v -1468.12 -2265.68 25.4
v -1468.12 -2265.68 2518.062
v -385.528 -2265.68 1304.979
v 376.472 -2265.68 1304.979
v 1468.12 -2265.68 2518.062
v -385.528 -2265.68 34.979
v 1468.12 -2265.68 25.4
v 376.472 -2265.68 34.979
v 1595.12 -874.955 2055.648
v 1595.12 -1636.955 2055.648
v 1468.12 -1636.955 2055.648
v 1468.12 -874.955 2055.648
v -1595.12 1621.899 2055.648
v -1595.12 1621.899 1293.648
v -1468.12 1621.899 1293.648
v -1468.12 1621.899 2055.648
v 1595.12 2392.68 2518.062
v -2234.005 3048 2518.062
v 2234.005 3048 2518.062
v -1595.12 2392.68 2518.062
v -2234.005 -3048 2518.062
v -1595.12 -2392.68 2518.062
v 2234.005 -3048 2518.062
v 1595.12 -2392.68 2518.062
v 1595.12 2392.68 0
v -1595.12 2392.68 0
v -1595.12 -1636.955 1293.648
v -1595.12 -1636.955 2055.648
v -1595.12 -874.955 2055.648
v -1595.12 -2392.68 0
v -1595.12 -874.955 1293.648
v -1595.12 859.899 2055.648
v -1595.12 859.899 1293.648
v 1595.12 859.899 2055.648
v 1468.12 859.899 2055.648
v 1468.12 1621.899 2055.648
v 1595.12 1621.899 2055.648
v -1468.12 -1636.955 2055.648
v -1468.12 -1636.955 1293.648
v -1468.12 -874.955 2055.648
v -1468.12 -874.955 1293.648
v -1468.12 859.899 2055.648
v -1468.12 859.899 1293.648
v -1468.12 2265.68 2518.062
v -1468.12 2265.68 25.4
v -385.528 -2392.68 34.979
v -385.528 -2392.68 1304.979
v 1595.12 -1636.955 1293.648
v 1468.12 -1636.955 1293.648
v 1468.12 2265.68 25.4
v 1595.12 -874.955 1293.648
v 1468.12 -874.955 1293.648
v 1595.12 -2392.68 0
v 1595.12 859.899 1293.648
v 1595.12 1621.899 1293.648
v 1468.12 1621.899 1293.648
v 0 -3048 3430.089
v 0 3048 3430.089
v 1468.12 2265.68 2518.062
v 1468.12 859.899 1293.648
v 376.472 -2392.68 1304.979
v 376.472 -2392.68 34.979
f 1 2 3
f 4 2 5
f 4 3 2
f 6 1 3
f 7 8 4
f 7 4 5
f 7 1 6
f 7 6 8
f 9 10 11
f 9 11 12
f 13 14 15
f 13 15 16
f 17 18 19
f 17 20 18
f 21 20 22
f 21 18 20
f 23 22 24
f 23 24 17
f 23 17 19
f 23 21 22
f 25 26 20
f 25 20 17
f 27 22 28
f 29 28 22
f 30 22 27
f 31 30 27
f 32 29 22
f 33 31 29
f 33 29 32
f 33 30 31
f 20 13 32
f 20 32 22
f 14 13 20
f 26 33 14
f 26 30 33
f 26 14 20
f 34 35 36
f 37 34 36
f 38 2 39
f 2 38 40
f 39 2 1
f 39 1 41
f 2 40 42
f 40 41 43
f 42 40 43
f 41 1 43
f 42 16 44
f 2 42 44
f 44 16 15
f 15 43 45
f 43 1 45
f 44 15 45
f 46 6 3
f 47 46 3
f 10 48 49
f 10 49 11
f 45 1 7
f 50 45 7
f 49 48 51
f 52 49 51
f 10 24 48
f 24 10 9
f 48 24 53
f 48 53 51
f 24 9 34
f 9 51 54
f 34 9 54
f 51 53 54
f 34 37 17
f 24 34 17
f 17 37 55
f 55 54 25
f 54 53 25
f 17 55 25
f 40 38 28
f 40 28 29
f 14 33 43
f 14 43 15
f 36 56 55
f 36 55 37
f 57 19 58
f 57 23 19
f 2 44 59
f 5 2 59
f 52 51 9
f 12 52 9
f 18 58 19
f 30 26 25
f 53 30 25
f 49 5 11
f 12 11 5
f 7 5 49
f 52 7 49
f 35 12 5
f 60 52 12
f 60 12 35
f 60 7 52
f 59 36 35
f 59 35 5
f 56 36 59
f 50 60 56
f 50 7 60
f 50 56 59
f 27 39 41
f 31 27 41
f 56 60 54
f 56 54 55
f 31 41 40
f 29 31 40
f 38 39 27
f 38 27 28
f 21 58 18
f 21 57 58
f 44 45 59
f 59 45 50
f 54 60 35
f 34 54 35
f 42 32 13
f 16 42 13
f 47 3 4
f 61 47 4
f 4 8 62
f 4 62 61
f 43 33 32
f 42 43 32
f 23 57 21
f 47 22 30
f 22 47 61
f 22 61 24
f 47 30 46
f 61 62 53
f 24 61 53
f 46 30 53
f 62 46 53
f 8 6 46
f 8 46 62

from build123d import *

# Parameters (mm, degrees)
F0_W     = 3190.24
F0_H     = 4785.36
F0_W_2   = 2936.24
F0_H_2   = 4531.36
F1_DEPTH = 2540
F2_DEPTH = 25.4
F4_DEPTH = 3048
F5_W     = 762
F5_H     = 1270
F6_DEPTH = 12700
F7_W     = 762
F7_H     = 762
F8_DEPTH = 3810


with BuildPart() as f1:
    # F0 (on Top) → F1 (new body)
    with BuildSketch(Plane.XY):
        Rectangle(F0_W, F0_H)
        Rectangle(F0_W_2, F0_H_2, mode=Mode.SUBTRACT)
    extrude(amount=F1_DEPTH)

    # F0 (on Top) → F2 (join)
    with BuildSketch(Plane.XY):
        Rectangle(F0_W_2, F0_H_2)
    extrude(amount=F2_DEPTH)

    # F3 (on Front) → F4 (join, symmetric)
    with BuildSketch(Plane.XZ):
        Polygon((0, 3430.088758), (-2234.00463, 2518.062272), (2234.00463, 2518.062272), align=None)
    extrude(amount=F4_DEPTH, both=True)

    # F5 (on Front) → F6 (cut)
    with BuildSketch(Plane.XZ):
        with Locations((-4.528345, 669.978624)):
            Rectangle(F5_W, F5_H)
    extrude(amount=F6_DEPTH, mode=Mode.SUBTRACT)

    # F7 (on Right) → F8 (cut, symmetric)
    with BuildSketch(Plane.YZ):
        with Locations((1240.899438, 1674.648087)):
            Rectangle(F7_W, F7_H)
        with Locations((-1255.954975, 1674.648087)):
            Rectangle(F7_W, F7_H)
    extrude(amount=F8_DEPTH, both=True, mode=Mode.SUBTRACT)


solid = f1.part
